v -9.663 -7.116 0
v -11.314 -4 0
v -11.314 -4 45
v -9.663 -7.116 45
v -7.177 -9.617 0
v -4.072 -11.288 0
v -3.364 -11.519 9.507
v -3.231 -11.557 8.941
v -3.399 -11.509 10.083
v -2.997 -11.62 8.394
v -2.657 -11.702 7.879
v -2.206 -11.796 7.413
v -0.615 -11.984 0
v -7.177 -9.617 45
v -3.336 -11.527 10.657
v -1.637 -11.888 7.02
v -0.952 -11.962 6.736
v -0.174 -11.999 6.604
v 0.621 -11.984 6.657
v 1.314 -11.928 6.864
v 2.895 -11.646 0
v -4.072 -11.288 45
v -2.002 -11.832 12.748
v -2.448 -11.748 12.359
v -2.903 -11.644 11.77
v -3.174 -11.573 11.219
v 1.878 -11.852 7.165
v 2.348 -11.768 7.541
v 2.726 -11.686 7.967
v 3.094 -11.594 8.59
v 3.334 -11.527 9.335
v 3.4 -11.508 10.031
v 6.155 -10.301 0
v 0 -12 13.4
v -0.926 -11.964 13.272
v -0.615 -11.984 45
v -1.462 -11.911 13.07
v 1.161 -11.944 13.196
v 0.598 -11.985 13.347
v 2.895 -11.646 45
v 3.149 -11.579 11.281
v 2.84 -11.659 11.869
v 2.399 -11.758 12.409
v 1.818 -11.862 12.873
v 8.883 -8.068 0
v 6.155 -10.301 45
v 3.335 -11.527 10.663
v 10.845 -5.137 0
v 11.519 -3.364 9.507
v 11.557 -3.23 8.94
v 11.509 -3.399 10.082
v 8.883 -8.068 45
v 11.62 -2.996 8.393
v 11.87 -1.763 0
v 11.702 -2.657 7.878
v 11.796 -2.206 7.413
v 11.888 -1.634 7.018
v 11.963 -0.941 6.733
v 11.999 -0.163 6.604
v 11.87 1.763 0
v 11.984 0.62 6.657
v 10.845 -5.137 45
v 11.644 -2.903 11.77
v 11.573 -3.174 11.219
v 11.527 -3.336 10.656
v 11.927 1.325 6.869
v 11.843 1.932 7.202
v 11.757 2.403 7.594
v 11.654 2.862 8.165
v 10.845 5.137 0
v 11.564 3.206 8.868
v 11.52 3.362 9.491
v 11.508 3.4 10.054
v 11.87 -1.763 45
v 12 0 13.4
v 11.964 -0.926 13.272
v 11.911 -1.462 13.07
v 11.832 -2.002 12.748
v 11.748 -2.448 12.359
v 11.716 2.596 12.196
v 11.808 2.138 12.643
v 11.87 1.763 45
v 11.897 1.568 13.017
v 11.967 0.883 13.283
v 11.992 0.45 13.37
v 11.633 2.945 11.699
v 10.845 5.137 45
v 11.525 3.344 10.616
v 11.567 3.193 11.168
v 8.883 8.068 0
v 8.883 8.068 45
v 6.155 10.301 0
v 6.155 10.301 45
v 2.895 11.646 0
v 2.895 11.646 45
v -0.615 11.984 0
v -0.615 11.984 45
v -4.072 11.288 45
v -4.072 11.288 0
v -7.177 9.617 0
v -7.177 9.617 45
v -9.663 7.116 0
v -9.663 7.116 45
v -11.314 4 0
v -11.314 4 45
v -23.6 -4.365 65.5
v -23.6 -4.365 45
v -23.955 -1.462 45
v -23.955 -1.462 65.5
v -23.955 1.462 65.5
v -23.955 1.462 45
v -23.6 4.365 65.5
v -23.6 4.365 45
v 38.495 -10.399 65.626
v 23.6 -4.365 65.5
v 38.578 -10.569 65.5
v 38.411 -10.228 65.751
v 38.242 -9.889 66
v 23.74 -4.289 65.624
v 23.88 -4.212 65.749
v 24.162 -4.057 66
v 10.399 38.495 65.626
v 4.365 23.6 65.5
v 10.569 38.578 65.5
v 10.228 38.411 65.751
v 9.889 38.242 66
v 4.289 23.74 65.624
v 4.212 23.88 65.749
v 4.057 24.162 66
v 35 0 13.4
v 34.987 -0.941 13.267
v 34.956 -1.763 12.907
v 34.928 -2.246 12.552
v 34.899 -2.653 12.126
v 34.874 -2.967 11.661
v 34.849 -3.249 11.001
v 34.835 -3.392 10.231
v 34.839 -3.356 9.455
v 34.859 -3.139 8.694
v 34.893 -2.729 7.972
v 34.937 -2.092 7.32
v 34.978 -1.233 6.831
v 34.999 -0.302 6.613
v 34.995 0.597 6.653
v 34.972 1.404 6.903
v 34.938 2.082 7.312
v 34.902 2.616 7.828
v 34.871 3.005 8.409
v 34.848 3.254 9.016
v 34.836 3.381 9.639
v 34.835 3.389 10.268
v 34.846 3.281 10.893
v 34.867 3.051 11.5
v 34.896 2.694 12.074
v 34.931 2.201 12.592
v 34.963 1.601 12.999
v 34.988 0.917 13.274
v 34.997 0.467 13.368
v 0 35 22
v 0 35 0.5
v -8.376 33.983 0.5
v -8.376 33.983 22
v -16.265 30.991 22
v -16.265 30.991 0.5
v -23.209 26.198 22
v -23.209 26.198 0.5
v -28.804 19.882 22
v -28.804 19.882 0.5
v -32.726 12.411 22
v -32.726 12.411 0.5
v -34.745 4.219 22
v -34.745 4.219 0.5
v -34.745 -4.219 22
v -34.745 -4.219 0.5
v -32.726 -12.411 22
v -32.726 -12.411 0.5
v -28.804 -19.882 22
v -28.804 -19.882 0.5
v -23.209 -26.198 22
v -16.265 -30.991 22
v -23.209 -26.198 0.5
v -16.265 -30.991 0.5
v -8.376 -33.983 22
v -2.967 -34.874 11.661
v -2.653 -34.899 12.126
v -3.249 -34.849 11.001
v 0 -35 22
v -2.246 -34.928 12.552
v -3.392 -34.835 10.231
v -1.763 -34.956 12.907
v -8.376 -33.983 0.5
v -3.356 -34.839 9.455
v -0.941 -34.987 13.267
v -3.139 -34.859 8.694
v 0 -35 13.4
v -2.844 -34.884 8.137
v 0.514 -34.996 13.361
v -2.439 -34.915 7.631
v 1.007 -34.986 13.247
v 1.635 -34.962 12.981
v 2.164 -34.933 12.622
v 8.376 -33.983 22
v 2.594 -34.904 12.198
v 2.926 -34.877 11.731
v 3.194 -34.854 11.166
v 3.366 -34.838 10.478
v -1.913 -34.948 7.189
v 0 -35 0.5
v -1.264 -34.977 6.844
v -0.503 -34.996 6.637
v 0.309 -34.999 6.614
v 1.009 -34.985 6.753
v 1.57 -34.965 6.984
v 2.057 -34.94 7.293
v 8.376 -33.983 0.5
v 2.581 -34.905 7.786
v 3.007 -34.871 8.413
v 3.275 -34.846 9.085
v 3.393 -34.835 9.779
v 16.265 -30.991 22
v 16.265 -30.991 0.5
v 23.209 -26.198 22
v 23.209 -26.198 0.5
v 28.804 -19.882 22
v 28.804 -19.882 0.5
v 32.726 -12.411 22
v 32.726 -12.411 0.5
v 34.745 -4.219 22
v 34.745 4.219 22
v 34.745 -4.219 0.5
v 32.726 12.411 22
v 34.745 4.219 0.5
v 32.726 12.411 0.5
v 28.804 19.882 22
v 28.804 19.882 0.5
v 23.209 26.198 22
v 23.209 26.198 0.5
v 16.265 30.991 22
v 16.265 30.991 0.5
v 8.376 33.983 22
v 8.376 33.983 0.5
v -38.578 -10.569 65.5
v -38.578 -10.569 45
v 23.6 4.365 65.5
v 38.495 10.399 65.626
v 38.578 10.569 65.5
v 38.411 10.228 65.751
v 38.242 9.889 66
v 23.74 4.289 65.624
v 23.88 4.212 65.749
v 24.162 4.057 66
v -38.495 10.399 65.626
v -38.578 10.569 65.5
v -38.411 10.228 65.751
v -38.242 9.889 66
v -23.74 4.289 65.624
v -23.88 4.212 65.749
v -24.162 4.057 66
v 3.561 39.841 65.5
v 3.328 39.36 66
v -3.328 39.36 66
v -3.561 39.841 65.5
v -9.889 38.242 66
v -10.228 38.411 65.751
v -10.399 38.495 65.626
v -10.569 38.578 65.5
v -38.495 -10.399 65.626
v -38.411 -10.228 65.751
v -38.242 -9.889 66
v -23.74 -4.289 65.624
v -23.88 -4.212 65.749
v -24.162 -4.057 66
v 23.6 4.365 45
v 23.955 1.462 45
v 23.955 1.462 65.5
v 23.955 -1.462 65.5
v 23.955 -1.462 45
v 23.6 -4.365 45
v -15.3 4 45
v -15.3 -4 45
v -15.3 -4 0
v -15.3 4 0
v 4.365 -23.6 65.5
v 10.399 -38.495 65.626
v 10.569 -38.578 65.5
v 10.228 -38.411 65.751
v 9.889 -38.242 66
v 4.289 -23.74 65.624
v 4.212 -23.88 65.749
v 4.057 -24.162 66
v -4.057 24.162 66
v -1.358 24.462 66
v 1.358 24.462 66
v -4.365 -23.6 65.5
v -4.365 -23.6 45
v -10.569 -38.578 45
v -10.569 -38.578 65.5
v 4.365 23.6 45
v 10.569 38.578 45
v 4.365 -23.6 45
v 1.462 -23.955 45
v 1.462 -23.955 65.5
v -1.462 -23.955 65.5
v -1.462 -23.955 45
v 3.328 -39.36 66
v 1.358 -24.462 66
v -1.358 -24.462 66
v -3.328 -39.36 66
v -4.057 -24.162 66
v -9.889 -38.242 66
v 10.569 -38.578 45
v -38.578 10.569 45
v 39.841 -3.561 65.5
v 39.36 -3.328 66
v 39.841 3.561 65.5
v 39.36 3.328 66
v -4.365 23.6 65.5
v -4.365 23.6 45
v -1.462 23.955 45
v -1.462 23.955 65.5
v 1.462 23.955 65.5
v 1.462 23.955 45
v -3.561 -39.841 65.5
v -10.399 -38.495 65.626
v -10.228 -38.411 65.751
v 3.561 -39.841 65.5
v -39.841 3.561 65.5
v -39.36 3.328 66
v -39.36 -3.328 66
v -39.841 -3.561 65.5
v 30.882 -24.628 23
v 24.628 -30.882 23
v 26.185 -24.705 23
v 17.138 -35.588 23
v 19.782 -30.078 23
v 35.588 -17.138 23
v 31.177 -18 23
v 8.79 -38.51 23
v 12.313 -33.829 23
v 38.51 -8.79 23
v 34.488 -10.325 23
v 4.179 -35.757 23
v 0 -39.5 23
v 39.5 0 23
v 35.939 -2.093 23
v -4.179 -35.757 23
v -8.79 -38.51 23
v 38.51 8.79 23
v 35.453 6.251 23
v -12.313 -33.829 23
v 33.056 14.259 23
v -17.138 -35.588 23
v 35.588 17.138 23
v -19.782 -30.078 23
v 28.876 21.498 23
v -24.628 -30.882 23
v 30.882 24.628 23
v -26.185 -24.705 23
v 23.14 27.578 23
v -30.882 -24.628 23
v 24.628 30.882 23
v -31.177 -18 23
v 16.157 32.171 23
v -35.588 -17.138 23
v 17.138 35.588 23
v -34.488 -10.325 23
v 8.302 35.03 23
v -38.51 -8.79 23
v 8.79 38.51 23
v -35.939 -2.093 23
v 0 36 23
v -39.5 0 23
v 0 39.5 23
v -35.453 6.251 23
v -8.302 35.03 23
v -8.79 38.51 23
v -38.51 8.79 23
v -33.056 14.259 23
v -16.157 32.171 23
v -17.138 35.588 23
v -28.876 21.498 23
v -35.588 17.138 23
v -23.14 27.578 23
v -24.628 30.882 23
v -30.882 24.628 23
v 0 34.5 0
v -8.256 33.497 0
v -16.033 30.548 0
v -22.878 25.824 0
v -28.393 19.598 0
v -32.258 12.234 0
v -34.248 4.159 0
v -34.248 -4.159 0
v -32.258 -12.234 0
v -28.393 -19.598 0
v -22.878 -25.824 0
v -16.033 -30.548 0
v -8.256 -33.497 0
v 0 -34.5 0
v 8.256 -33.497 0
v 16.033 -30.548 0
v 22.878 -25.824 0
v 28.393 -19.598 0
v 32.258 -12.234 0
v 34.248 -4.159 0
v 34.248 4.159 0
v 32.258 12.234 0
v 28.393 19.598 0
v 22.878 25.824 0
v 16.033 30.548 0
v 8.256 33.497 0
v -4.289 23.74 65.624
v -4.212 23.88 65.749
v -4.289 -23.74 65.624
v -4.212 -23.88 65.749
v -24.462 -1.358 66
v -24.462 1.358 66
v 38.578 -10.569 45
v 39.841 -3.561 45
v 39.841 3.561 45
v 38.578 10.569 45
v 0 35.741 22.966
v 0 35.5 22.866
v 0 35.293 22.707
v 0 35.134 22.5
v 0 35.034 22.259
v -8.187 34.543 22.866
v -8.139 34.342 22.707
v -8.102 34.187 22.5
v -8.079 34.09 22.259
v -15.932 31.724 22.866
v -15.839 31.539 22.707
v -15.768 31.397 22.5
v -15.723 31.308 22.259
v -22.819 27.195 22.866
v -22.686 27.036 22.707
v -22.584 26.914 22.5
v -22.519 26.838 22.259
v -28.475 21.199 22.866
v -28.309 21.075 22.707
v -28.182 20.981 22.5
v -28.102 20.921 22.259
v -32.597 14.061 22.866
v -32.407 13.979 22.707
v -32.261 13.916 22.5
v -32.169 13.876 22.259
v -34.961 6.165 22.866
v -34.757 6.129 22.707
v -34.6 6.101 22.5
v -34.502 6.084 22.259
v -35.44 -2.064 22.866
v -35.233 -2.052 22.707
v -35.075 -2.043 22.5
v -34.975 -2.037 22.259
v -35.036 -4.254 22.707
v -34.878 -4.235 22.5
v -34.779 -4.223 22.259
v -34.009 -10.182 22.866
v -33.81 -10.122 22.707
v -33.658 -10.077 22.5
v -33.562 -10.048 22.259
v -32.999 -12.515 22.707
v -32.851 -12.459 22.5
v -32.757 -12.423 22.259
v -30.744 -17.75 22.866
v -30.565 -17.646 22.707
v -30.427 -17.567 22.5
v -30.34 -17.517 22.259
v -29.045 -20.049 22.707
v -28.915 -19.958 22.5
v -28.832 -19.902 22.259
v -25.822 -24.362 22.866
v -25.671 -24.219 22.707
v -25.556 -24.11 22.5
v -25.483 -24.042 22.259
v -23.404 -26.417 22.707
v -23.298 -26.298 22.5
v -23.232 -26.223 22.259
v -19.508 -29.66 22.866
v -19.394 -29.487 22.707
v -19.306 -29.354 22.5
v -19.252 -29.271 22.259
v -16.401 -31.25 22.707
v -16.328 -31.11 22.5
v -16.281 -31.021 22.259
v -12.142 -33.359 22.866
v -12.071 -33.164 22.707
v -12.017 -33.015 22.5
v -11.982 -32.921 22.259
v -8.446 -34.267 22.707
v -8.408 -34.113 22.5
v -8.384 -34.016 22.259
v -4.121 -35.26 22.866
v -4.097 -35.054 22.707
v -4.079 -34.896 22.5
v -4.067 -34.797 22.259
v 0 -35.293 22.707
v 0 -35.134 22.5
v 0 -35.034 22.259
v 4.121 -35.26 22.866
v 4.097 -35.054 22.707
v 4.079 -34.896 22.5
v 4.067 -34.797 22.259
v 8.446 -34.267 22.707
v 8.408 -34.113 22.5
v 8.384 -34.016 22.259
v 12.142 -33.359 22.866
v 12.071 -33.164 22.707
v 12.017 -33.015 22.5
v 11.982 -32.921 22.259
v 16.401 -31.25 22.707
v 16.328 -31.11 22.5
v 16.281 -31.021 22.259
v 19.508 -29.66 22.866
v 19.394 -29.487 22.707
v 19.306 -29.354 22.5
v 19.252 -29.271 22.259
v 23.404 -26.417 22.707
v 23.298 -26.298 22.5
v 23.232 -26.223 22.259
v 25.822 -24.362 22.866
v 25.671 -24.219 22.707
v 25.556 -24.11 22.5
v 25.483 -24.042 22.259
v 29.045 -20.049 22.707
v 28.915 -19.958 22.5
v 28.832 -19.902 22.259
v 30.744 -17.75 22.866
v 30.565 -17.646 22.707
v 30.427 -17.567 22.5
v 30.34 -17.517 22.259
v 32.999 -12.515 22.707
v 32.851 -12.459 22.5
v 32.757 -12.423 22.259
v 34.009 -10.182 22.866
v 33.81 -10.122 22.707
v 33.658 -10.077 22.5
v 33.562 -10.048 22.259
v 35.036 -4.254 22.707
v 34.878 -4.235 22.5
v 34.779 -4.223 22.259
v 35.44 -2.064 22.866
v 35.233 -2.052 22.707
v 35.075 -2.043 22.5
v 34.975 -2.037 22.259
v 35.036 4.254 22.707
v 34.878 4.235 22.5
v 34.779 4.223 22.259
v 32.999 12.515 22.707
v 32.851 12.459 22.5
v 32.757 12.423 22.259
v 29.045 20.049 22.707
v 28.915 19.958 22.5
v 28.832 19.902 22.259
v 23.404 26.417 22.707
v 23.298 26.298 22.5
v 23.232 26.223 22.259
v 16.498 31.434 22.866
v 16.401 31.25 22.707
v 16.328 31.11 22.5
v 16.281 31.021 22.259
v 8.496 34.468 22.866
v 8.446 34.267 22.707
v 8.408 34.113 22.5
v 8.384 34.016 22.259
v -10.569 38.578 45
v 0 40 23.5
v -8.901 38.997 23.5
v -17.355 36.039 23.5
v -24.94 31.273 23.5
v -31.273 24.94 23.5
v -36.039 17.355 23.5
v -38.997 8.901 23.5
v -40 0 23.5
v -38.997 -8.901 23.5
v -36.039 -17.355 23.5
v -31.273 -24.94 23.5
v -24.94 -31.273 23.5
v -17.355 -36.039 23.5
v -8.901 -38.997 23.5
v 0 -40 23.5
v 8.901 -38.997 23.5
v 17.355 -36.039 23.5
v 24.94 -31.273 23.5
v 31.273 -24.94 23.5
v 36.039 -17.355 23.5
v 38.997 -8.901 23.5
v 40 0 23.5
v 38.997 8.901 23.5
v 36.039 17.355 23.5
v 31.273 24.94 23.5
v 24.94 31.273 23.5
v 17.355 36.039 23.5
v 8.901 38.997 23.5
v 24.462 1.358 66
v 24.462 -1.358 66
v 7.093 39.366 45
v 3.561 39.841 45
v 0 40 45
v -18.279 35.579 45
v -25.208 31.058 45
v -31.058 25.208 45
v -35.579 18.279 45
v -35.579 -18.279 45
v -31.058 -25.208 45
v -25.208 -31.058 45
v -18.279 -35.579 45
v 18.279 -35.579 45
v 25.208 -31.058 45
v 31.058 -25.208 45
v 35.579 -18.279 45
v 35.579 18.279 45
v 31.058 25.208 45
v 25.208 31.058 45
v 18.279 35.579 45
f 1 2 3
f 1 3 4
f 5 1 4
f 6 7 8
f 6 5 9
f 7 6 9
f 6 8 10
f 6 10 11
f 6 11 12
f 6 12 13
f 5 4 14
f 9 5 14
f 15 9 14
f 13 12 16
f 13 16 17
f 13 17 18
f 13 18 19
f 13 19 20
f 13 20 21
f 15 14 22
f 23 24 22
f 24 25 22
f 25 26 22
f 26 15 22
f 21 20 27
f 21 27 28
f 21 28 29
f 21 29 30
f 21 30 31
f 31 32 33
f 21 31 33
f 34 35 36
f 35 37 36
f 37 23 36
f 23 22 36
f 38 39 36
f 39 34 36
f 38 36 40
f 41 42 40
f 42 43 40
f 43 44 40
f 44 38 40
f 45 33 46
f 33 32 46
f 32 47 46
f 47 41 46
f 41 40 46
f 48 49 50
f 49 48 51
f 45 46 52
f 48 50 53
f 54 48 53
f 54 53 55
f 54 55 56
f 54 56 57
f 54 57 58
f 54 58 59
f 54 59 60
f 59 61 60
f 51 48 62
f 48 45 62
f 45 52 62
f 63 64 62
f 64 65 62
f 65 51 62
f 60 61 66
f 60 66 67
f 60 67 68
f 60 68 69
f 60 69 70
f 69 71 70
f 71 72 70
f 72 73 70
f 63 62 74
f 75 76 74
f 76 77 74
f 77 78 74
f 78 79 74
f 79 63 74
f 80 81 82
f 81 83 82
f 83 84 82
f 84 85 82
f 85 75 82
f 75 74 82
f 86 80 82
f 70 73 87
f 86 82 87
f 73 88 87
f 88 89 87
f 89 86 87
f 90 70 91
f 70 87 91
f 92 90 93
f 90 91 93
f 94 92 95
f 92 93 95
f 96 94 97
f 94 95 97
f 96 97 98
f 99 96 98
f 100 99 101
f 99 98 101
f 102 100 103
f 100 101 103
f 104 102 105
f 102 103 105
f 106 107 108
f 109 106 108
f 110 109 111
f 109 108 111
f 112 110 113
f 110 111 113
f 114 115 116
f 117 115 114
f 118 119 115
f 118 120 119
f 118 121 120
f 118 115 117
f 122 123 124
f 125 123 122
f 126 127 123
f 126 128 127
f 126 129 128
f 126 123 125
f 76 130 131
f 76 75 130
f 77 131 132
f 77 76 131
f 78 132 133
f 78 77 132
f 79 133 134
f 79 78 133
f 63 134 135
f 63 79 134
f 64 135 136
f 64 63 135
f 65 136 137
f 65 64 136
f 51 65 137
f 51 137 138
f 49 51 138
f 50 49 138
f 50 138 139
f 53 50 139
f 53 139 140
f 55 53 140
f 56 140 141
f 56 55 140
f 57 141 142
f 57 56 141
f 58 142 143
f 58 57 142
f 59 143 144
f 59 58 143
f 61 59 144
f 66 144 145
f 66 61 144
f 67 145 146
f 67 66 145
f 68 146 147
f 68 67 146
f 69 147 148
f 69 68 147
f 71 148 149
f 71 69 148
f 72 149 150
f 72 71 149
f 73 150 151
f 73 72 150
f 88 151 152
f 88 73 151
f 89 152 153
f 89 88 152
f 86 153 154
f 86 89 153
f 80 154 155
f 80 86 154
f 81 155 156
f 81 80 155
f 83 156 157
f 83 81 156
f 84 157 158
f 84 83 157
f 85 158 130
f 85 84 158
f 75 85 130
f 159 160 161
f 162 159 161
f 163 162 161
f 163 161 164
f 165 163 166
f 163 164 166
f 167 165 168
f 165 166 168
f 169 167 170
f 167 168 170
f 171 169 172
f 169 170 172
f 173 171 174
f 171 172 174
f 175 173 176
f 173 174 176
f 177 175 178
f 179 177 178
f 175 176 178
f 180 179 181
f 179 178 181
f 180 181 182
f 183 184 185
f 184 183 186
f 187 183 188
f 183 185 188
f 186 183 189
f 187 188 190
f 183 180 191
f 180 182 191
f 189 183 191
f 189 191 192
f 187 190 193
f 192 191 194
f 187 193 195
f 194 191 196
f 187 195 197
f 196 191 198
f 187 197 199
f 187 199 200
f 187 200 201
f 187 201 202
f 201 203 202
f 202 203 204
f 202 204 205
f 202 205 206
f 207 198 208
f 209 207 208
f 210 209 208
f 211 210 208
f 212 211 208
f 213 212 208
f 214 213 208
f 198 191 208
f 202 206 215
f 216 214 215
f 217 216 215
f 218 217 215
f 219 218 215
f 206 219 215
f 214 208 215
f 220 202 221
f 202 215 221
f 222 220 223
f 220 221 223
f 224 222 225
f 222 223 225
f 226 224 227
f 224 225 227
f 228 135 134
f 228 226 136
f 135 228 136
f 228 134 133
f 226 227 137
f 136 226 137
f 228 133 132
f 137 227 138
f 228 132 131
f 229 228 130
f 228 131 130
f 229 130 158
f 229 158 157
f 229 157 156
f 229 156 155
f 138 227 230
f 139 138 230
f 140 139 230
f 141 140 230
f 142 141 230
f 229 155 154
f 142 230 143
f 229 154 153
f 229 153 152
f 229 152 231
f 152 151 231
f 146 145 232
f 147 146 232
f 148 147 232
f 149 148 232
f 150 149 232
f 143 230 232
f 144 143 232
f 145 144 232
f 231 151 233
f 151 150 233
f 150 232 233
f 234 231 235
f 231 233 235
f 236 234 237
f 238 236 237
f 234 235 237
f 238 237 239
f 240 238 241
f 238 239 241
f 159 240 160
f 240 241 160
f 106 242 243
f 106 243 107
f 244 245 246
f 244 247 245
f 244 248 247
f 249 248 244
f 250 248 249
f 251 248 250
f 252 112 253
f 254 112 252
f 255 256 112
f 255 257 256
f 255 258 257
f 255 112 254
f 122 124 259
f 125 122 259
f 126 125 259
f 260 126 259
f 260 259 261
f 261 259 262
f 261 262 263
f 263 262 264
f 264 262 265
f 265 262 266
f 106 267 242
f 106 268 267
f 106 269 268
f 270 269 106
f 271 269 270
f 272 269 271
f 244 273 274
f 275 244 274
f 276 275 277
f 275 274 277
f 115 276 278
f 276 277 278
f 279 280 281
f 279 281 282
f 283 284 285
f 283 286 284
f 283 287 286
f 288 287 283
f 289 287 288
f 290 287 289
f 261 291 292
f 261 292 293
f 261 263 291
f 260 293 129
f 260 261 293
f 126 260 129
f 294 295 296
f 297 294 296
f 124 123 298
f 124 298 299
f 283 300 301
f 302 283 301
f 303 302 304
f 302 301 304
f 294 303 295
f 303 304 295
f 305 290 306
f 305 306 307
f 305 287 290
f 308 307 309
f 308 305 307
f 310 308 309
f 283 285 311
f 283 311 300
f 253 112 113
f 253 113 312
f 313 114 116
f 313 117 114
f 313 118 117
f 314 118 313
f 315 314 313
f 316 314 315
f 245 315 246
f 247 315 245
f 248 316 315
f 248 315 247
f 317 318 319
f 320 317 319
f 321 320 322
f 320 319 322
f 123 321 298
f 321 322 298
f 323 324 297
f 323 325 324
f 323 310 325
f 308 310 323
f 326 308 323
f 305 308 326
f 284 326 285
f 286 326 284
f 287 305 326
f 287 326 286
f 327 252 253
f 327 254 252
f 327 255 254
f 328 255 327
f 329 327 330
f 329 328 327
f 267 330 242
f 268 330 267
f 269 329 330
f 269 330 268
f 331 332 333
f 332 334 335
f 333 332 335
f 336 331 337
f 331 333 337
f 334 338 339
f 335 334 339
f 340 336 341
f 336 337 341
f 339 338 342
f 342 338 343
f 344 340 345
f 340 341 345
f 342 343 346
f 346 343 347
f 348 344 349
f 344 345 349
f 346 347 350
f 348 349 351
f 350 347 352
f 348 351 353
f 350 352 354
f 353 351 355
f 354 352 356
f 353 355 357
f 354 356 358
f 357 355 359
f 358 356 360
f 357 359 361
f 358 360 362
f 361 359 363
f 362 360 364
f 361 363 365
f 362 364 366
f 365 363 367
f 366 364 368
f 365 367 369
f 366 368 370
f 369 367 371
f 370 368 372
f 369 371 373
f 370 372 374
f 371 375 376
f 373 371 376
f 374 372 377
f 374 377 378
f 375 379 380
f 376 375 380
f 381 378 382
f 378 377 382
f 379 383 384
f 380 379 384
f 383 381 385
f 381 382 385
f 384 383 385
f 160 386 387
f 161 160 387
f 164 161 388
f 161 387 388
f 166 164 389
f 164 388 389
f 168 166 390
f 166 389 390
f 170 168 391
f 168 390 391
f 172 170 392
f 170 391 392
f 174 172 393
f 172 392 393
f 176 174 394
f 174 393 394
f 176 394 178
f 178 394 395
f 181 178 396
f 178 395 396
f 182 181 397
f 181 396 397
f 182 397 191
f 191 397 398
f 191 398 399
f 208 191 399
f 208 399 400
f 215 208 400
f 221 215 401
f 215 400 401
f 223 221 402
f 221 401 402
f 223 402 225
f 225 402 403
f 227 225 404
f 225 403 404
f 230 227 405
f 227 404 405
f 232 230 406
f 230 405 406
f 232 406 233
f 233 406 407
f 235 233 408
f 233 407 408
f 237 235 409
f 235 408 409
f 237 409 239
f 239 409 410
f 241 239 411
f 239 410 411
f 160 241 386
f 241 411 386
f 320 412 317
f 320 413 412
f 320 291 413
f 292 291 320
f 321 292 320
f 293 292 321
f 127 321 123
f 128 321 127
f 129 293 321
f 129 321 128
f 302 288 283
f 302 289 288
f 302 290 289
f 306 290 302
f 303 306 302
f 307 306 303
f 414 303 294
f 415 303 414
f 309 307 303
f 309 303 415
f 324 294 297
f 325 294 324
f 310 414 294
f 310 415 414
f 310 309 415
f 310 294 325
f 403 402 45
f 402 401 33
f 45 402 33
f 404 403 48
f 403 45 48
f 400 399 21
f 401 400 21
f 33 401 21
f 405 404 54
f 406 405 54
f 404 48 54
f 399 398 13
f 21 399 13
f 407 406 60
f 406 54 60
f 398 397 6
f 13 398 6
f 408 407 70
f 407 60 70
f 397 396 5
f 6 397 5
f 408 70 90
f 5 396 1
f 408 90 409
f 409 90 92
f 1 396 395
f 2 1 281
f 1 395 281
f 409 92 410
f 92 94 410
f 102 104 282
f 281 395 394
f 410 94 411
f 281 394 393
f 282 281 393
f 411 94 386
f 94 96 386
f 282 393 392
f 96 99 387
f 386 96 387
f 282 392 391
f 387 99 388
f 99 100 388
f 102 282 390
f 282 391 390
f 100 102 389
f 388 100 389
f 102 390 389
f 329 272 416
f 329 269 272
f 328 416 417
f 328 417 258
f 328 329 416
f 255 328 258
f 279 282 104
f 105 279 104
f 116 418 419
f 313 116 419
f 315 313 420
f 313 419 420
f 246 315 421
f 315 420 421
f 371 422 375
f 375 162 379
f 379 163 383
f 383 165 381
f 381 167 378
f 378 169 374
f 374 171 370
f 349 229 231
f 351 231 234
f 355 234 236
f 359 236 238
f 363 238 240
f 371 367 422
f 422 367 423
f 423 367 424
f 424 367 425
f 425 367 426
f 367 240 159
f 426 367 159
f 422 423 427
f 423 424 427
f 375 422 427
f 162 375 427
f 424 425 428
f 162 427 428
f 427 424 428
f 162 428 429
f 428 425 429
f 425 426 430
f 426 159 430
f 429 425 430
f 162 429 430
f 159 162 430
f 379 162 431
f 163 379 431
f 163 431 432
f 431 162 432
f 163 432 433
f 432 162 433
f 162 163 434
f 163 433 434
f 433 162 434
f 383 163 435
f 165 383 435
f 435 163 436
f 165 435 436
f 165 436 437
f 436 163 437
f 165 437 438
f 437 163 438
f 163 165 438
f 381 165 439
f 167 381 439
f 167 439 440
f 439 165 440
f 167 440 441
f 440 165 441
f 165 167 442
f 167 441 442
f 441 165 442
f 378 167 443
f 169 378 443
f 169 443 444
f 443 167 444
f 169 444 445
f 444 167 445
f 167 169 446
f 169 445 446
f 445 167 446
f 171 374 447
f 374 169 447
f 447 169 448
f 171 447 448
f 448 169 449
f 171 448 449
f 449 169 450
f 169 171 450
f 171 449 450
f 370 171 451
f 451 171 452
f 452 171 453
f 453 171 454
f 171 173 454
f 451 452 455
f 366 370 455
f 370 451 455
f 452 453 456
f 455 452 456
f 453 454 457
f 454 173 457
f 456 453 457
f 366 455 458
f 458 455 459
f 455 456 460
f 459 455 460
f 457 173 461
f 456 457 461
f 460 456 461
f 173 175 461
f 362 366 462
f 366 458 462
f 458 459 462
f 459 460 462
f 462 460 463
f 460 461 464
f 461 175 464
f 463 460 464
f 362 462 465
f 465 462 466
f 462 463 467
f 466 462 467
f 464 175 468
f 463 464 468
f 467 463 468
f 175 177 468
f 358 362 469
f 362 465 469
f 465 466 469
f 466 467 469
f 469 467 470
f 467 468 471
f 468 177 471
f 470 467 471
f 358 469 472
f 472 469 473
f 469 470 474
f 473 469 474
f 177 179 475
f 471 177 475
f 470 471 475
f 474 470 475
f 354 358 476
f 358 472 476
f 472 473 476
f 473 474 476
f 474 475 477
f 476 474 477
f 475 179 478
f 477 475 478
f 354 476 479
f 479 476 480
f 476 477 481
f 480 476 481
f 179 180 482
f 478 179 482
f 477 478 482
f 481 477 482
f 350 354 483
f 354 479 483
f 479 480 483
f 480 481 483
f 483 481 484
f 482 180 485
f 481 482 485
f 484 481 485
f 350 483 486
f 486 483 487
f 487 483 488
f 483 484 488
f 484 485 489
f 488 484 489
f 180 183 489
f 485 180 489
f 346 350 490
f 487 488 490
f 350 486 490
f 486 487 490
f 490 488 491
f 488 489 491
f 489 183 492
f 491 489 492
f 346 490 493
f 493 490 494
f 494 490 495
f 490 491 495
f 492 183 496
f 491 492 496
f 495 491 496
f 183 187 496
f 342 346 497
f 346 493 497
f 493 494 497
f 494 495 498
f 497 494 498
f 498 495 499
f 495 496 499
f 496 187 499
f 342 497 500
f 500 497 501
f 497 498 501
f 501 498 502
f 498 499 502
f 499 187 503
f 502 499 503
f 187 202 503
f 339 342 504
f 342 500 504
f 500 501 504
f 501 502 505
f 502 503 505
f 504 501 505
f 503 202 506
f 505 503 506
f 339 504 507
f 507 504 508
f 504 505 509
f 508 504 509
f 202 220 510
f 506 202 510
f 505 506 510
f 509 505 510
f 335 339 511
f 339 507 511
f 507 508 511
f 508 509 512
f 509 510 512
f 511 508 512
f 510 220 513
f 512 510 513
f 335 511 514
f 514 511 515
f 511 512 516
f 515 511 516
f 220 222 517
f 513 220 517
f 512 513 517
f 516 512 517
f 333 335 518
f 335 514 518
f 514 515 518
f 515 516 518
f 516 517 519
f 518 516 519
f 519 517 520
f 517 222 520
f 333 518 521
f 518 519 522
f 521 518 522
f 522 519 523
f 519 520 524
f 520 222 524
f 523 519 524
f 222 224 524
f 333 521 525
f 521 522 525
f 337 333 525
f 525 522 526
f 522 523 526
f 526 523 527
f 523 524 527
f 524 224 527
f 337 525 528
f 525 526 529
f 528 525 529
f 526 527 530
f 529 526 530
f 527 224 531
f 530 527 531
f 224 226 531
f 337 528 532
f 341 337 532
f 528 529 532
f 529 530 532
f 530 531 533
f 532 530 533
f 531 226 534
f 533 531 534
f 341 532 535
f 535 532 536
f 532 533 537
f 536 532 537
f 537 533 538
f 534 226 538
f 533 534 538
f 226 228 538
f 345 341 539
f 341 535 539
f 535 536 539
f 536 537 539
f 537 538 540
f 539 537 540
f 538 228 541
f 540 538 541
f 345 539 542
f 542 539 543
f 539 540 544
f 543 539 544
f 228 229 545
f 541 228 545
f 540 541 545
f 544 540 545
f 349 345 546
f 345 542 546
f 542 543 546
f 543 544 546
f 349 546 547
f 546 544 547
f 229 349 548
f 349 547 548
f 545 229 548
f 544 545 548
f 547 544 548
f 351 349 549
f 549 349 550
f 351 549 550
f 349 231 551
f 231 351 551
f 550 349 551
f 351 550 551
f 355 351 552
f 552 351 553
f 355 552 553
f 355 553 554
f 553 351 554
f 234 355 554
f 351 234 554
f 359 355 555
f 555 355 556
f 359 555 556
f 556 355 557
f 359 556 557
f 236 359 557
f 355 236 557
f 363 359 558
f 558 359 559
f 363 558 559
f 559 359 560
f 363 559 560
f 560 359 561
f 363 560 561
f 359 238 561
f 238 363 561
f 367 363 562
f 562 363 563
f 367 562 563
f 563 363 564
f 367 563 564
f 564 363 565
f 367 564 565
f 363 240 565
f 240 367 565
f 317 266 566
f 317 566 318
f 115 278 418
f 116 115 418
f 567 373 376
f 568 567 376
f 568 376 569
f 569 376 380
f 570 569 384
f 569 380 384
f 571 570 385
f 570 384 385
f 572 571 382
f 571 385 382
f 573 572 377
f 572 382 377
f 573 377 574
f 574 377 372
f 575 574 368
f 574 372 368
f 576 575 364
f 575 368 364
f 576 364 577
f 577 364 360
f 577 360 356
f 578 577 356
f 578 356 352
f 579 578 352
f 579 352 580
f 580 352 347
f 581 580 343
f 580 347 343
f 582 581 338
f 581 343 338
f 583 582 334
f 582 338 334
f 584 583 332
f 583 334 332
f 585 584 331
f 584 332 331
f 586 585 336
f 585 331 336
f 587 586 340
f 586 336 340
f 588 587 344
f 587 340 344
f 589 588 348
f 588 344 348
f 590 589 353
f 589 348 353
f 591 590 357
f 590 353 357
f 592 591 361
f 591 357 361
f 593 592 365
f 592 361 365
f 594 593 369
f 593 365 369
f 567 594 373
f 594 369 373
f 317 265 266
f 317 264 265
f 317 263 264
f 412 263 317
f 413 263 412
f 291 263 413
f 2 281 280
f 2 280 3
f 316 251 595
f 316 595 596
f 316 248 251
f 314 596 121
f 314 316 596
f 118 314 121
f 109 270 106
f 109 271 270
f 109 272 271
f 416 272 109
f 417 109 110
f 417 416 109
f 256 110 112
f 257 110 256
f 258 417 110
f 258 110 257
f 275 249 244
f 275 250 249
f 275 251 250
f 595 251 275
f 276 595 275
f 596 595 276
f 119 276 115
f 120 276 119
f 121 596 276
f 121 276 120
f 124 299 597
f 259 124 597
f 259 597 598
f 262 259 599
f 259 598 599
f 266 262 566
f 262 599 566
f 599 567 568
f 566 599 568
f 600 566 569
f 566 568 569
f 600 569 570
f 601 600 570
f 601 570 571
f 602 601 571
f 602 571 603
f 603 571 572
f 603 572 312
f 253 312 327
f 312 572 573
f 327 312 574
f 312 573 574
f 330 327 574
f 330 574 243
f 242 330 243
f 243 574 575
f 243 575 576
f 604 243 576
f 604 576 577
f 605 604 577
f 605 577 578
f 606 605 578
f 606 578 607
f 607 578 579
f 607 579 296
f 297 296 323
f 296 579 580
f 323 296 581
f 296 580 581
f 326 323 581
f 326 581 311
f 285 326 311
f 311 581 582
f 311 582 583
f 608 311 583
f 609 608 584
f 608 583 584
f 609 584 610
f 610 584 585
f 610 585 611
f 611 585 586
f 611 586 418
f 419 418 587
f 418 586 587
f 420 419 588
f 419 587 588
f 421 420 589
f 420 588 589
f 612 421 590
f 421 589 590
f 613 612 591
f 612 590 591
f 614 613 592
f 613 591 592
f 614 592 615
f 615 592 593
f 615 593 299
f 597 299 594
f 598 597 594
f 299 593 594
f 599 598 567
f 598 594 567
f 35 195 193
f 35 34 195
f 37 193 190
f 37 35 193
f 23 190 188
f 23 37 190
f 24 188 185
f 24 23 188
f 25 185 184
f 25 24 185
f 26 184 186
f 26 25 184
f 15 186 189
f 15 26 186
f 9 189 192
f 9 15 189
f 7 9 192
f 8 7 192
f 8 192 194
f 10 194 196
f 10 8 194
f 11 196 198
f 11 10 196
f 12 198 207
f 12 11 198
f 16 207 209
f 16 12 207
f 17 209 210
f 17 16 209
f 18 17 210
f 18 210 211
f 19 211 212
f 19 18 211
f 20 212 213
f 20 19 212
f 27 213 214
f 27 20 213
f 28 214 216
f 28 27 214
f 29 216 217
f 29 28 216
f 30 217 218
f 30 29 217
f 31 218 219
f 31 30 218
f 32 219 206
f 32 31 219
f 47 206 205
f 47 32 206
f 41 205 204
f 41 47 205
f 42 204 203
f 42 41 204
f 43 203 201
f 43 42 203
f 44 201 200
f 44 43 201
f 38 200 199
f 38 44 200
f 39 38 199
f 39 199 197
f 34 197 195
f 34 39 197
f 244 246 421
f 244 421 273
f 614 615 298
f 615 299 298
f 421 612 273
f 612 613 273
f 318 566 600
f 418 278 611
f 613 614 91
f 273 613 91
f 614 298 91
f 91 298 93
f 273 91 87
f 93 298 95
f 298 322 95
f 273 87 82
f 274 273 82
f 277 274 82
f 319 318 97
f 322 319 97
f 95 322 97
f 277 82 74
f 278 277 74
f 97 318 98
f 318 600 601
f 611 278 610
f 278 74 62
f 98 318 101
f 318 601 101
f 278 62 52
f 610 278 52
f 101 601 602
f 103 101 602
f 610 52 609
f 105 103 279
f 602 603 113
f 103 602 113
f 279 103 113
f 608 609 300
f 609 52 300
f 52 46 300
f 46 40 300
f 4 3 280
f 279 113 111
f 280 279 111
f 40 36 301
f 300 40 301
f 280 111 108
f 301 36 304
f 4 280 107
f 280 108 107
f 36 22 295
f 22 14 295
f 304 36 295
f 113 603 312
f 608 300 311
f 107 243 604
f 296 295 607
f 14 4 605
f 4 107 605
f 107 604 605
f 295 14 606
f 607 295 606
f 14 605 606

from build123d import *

# Parameters (mm, degrees)
BOSS_EXTRUDE1_DEPTH = 21
CIRPATTERN1_COUNT   = 4
CHAMFER1_SIZE       = 0.5
SKETCH4_W           = 6.599999999999998
SKETCH4_H           = 8
CUT_EXTRUDE1_DEPTH  = 73.2841614740048
CHAMFER2_SIZE       = 0.5
FILLET1_R           = 1
CIRPATTERN4_COUNT   = 4


with BuildPart() as part:
    # Sketch1 → Revolve1 (revolve)
    with BuildSketch(Plane(origin=(0, 0, 0), x_dir=(0, 0, -1), z_dir=(1, 0, 0))):
        Polygon((-7.9e-16, 35), (0, 11.999999999999998), (-45, 11.999999999999995), (-45, 39.999999999999986), (-23, 39.99999999999999), (-23, 35), align=None)
    revolve(axis=Axis((0, 0, 0), (0, -1.2e-16, 1)))

    # Sketch3 → Boss-Extrude1 (add)
    with BuildSketch(Plane.XY.offset(44.99999999999999)):
        with BuildLine():
            ThreePointArc((-4.365000000000001, 23.599719807658744), (-2.1916574340201906, 23.89972045217066), (-3.535e-13, 24.00000000000001))
            Line((0, 24.00000000000001), (0, 40))
            ThreePointArc((1.49969e-12, 40), (-5.332266542852567, 39.642993498422584), (-10.569350394509474, 38.578346675798365))
            Line((-10.569350394509476, 38.57834667579836), (-4.365, 23.599719807658744))
        make_face()
        with BuildLine():
            Line((0, 40), (0, 24.00000000000001))
            ThreePointArc((-3.5261e-13, 24.00000000000001), (2.191657434019837, 23.89972045217069), (4.365, 23.599719807658744))
            Line((4.365, 23.599719807658744), (10.569350394509485, 38.57834667579835))
            ThreePointArc((10.569350394509485, 38.57834667579835), (5.332266542854057, 39.64299349842238), (1.49969e-12, 40))
        make_face()
    boss_extrude1 = extrude(amount=BOSS_EXTRUDE1_DEPTH)

    # CirPattern1: Boss-Extrude1 ×4 about axis
    cirpattern1_axis = Axis((6e-17, -4.97e-15, 0), (0, 0, 1))
    for i in range(1, CIRPATTERN1_COUNT):
        add(boss_extrude1.rotate(cirpattern1_axis, i * 360 / CIRPATTERN1_COUNT))

    # Chamfer1
    chamfer1_edges = [part.edges().sort_by_distance(p)[0] for p in [
        (4.4e-16, 24.000000000000004, 66),
        (-7.467175197254738, 31.089033241728544, 66),
        (7.467175197254742, 31.08903324172854, 66),
        (9.77e-15, 39.999999999999986, 66),
        (24.000000000000007, -1.068e-14, 66),
        (31.08903324172855, 7.467175197254726, 66),
        (31.089033241728547, -7.467175197254755, 66),
        (39.99999999999999, -2.356e-14, 66),
        (-3.26e-15, -24.000000000000014, 66),
        (7.467175197254734, -31.089033241728554, 66),
        (-7.467175197254746, -31.08903324172855, 66),
        (-1.455e-14, -39.99999999999999, 66),
        (-24.000000000000007, -1.92e-15, 66),
        (-31.08903324172855, -7.46717519725474, 66),
        (-31.089033241728547, 7.467175197254741, 66),
        (-39.99999999999999, 9.18e-15, 66),
    ]]
    chamfer(chamfer1_edges, length=CHAMFER1_SIZE)

    # Sketch4 → Cut-Extrude1 (cut, through all)
    with BuildSketch(Plane.XY.offset(44.99999999999999)):
        with Locations((-12.000000000000002, 0)):
            Rectangle(SKETCH4_W, SKETCH4_H)
    extrude(amount=-CUT_EXTRUDE1_DEPTH, mode=Mode.SUBTRACT)

    # Chamfer2
    chamfer2_edges = [part.edges().sort_by_distance(p)[0] for p in [
        (-4.9e-15, -39.99999999999999, 22.999999999999993),
        (-4.29e-15, -35, -7.95e-15),
    ]]
    chamfer(chamfer2_edges, length=CHAMFER2_SIZE)

    # Fillet1
    fillet1_edges = [part.edges().sort_by_distance(p)[0] for p in [
        (-4.29e-15, -35, 22.999999999999993),
    ]]
    fillet(fillet1_edges, radius=FILLET1_R)

    # Sketch6 → M8x1.25 Tapped Hole1 (revolve, cut)
    with BuildSketch(Plane(origin=(0, 0, 10), x_dir=(0, 0, 1), z_dir=(0, 1, 0))):
        Polygon((0, 0), (-9.8e-15, 39.99999999999999), (3.3999999999999946, 39.99999999999999), (3.3999999999999995, 3.6e-16), align=None)
    m8x1_25_tapped_hole1 = revolve(axis=Axis((-6.349999999999991, 0, 10), (1, 0, 0)), mode=Mode.SUBTRACT)

    # CirPattern4: M8x1.25 Tapped Hole1 ×4 about axis, 2 skipped
    cirpattern4_axis = Axis((0, 0, 0), (0, -1.2e-16, 1))
    add([m8x1_25_tapped_hole1.rotate(cirpattern4_axis, i * 360 / CIRPATTERN4_COUNT) for i in range(1, CIRPATTERN4_COUNT) if i not in (1, 2)], mode=Mode.SUBTRACT)


solid = part.part
